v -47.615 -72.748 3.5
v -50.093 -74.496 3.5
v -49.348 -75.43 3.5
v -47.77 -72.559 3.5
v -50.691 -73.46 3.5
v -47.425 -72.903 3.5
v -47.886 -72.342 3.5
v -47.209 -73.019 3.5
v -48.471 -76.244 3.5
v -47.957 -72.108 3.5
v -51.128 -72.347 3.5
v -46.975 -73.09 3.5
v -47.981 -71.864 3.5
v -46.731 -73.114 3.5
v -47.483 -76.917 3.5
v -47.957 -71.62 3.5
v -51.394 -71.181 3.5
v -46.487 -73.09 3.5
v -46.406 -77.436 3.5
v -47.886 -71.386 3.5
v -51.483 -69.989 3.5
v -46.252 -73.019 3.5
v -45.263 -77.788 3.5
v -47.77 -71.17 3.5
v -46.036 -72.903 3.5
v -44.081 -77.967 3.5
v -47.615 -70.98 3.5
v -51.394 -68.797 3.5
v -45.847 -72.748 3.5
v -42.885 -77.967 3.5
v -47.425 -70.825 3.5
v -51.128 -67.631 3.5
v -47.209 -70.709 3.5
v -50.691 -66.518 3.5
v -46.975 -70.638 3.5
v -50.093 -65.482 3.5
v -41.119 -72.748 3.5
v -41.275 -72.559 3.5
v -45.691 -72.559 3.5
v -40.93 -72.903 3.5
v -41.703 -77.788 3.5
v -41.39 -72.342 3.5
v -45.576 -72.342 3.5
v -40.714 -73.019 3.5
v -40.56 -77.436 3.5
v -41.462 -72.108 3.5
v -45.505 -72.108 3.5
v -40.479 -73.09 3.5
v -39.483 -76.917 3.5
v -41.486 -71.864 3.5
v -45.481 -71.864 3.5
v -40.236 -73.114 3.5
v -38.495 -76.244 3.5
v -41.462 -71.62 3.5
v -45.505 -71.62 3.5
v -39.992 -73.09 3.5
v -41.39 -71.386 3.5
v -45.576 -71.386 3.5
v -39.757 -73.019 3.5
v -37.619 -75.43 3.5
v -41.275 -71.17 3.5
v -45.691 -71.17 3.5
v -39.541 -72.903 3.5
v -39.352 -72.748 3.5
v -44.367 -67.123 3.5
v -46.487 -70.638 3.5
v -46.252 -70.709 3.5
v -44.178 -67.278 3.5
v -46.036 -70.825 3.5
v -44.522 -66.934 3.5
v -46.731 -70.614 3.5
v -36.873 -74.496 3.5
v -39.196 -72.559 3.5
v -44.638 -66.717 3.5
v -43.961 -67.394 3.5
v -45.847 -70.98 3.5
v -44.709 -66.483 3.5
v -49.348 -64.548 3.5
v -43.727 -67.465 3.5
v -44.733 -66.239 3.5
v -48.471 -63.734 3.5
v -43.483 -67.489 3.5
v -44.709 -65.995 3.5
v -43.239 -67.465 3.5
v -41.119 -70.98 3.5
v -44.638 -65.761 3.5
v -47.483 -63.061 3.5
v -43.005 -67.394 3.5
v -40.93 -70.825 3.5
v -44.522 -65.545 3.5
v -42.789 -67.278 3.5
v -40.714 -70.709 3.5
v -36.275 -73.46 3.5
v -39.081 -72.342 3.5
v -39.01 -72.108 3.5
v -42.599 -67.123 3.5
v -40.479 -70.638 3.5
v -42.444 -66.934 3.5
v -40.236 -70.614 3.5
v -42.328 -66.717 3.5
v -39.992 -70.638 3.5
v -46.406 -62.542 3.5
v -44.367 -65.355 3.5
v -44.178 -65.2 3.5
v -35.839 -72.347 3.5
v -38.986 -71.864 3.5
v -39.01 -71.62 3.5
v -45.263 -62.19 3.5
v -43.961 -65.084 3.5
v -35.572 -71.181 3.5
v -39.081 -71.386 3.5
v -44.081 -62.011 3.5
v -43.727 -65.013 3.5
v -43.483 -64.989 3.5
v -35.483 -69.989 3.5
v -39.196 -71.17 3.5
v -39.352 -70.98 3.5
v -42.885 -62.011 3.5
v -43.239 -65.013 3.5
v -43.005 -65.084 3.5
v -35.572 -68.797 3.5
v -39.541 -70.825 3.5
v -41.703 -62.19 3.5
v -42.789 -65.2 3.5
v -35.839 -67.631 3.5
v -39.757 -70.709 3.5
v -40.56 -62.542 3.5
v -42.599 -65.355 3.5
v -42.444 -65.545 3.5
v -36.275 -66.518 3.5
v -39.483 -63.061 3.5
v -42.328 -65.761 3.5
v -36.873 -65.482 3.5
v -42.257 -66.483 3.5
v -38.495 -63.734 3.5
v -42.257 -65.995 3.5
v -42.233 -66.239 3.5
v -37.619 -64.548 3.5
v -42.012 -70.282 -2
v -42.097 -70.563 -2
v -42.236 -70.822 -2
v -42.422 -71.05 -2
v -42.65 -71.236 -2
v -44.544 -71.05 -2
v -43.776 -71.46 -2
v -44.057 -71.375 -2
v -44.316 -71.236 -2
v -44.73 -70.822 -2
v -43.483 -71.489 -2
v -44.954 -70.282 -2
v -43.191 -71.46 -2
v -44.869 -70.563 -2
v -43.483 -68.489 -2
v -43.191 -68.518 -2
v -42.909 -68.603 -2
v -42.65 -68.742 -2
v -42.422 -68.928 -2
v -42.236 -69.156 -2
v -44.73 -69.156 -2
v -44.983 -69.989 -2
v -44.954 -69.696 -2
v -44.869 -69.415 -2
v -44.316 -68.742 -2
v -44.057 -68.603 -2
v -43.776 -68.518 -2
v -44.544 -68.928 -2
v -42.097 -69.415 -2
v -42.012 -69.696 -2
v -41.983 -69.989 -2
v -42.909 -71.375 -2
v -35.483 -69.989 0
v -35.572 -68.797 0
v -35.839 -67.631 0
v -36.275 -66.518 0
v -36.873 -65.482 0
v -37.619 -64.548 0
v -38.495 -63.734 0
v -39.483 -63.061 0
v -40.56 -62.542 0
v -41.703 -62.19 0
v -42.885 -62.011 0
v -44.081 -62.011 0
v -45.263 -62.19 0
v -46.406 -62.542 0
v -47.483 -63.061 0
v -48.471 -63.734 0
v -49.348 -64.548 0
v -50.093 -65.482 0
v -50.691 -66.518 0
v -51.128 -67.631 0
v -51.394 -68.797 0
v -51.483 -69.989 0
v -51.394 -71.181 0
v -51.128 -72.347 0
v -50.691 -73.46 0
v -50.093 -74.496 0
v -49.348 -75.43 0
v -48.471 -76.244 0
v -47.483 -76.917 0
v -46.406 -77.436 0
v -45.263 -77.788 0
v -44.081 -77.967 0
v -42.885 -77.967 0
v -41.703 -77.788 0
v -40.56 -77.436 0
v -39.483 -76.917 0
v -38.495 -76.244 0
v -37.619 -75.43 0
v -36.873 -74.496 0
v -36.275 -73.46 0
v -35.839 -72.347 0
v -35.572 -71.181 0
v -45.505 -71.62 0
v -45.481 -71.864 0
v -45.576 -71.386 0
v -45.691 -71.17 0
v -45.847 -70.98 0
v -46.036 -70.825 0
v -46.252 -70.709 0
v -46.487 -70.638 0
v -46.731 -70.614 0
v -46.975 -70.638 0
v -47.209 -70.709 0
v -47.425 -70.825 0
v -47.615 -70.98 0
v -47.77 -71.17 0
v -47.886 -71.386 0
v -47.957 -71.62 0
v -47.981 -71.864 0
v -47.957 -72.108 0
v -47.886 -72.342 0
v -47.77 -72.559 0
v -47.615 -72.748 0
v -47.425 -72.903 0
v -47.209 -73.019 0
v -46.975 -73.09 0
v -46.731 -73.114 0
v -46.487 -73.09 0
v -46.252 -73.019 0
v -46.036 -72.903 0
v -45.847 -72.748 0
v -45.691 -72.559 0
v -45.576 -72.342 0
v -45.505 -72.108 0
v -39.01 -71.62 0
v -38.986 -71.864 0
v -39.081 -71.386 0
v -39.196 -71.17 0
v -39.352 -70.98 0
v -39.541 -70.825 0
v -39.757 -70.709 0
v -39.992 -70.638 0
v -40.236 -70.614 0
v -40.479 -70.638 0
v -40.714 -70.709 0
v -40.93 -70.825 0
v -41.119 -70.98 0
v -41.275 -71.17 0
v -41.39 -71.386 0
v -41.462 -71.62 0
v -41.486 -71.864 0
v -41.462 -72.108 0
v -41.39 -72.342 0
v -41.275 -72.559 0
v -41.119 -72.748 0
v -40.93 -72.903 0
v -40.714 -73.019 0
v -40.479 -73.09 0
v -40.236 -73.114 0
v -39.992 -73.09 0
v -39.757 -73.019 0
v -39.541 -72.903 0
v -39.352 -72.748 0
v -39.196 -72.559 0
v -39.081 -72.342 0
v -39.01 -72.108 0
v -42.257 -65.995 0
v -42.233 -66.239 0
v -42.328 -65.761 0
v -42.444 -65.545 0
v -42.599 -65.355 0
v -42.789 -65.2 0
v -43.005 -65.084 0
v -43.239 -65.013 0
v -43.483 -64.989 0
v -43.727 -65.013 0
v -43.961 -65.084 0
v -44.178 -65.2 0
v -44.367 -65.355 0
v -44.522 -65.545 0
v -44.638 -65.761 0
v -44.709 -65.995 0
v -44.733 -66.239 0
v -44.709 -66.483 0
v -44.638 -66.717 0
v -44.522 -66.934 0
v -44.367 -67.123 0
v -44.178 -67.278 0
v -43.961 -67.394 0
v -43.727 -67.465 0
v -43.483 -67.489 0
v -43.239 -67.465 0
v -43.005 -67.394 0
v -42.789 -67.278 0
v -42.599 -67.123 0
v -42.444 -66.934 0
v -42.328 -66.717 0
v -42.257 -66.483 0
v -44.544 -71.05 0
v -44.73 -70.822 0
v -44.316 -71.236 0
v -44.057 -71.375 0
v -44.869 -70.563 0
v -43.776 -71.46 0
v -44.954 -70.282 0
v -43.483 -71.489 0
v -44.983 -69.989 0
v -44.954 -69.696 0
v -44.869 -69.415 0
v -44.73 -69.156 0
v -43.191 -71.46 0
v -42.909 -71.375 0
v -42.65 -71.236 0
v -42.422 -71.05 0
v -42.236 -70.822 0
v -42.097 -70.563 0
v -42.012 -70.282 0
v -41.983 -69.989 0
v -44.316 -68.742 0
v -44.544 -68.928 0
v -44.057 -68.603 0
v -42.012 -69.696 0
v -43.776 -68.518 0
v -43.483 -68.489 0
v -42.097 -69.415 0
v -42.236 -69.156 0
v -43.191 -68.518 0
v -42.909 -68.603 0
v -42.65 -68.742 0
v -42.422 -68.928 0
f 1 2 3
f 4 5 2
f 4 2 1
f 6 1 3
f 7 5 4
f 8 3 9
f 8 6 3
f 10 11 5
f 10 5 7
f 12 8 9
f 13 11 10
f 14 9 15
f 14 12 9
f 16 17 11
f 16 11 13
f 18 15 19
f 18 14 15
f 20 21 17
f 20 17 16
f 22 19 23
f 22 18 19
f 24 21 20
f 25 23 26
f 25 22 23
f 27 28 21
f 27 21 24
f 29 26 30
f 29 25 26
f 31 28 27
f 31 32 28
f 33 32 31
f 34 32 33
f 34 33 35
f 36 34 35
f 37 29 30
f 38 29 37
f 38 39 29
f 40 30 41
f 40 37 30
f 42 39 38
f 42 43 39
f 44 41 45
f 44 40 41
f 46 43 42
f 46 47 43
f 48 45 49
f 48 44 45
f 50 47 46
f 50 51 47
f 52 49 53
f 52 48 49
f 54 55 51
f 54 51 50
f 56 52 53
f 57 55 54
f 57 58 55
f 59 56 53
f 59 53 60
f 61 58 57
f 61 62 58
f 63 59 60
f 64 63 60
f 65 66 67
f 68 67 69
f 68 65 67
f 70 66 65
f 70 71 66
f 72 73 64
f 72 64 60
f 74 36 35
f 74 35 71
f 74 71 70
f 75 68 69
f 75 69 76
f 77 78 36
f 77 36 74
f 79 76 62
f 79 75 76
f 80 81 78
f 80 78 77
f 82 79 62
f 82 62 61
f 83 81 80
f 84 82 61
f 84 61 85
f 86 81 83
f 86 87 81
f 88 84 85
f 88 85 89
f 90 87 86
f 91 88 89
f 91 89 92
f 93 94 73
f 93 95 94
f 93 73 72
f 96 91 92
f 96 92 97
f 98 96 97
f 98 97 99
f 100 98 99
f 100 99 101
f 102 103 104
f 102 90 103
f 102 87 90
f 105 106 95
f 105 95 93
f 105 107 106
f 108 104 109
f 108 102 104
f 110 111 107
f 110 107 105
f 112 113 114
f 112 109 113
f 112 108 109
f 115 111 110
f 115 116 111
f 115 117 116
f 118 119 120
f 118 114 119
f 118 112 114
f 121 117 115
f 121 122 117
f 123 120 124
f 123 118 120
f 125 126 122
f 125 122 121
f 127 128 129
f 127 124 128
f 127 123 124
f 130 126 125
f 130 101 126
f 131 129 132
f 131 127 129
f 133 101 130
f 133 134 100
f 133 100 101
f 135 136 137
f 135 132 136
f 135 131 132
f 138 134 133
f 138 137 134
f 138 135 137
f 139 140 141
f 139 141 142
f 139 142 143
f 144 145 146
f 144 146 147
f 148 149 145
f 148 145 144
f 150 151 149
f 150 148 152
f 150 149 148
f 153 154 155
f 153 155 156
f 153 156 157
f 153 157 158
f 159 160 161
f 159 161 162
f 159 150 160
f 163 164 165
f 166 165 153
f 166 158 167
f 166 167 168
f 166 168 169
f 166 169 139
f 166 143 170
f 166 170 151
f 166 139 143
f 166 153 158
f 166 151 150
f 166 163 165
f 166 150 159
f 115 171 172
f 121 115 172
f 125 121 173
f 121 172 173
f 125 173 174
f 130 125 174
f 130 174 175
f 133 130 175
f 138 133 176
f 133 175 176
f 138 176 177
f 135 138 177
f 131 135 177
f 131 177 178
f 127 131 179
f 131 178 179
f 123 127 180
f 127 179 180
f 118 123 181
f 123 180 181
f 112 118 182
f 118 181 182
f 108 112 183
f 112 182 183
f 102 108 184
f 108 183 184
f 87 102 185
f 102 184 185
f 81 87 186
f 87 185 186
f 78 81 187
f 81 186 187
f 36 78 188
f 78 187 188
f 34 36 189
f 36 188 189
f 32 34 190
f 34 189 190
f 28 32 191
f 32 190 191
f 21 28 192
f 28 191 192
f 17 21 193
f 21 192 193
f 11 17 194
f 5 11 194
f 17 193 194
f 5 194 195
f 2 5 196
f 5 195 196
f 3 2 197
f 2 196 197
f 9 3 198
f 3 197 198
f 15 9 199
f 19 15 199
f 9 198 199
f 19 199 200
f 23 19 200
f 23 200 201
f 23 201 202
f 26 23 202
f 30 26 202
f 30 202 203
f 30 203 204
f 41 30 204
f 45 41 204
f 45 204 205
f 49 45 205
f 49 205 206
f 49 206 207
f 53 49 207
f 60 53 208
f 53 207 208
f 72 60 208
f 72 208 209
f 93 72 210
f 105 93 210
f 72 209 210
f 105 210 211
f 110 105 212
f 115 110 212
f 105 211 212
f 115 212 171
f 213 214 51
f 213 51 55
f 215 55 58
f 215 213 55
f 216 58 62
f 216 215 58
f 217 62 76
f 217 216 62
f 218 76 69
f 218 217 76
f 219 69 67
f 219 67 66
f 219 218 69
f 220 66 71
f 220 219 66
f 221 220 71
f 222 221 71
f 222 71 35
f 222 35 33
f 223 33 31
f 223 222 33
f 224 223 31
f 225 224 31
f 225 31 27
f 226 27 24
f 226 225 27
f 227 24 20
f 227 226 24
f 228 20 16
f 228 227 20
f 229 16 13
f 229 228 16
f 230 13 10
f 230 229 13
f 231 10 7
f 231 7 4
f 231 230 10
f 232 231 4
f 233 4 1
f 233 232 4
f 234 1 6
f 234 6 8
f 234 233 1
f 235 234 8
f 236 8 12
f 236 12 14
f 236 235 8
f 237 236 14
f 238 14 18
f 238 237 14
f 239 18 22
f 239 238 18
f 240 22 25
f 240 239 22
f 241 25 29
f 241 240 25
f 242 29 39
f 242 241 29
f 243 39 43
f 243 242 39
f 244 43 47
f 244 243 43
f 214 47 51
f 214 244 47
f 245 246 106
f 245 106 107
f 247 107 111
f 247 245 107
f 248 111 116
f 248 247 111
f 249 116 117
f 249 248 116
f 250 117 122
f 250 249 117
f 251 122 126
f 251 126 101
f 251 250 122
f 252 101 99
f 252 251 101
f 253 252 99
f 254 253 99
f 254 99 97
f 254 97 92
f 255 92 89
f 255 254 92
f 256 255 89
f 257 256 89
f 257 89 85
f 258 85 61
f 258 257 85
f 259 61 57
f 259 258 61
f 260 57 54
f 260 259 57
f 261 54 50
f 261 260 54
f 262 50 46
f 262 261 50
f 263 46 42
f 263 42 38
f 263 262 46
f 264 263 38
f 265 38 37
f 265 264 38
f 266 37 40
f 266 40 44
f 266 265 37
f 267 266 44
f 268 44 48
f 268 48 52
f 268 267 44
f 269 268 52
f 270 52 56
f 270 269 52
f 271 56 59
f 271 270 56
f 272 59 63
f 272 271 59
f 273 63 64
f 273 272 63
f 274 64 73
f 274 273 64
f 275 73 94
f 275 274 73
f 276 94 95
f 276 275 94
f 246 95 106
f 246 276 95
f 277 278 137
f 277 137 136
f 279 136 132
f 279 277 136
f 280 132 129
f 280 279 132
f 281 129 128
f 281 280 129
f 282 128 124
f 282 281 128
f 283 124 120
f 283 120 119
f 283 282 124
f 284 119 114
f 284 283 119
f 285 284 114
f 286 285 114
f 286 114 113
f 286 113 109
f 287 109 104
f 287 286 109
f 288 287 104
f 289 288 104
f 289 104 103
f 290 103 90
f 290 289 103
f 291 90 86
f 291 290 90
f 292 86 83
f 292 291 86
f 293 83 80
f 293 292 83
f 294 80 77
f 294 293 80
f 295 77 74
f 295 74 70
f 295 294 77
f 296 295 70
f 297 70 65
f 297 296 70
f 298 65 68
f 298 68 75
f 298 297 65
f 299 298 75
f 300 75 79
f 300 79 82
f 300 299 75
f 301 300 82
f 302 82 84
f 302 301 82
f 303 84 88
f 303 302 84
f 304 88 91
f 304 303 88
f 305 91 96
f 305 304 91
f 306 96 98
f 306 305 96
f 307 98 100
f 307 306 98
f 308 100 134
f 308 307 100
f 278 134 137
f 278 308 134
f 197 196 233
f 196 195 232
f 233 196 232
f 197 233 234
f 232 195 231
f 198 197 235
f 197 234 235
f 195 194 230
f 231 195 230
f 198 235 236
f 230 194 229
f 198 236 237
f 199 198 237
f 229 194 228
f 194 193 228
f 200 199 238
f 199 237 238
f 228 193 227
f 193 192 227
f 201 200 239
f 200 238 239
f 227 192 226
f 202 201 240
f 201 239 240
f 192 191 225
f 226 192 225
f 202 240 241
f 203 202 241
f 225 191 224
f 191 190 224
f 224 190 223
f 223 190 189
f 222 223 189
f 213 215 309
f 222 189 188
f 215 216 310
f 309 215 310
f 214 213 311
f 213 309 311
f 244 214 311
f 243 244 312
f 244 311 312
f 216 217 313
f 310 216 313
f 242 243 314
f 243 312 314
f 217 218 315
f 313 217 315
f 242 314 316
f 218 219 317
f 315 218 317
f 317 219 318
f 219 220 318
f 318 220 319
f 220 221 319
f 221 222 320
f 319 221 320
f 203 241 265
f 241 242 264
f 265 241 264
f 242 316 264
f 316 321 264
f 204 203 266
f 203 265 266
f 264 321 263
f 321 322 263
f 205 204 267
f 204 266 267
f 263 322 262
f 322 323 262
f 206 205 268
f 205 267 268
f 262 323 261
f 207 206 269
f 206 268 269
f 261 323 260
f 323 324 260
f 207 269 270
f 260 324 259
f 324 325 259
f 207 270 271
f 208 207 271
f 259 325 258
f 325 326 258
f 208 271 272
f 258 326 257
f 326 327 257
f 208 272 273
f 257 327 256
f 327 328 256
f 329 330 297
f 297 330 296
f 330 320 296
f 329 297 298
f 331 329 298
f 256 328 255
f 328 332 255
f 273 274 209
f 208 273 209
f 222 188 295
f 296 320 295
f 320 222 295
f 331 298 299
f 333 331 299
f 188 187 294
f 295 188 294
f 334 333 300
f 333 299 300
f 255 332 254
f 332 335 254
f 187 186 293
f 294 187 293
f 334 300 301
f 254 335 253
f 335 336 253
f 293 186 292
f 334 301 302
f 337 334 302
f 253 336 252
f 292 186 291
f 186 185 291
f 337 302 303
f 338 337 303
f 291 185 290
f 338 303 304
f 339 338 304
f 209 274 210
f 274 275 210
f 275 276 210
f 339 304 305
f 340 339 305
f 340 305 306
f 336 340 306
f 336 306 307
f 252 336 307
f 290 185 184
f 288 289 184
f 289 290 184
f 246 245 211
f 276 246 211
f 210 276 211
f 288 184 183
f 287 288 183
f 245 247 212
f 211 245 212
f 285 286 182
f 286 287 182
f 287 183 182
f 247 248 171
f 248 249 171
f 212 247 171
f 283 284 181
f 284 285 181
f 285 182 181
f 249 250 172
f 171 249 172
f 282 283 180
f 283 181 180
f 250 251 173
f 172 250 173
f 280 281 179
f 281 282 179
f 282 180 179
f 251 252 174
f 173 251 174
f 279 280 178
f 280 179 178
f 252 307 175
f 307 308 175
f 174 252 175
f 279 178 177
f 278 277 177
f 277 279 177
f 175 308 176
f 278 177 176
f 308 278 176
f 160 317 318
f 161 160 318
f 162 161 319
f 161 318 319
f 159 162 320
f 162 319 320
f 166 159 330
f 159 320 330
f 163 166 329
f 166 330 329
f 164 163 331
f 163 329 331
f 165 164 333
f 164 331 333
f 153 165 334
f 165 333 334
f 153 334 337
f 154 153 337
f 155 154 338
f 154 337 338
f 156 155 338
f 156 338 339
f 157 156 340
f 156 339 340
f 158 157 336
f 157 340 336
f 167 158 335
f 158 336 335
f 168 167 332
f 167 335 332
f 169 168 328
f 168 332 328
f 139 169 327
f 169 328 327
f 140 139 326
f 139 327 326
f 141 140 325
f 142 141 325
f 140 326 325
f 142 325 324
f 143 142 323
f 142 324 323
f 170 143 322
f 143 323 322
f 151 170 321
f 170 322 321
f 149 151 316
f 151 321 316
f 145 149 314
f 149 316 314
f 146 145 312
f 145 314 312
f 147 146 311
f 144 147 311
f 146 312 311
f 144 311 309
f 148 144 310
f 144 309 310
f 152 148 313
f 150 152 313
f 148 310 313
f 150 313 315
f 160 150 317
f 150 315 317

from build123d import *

# Parameters (mm, degrees)
SKETCH1_R           = 8
SKETCH1_R_2         = 6
SKETCH1_R_3         = 1.25
SKETCH1_R_4         = 1.5
BOSS_EXTRUDE1_DEPTH = 3.5
SKETCH2_R           = 1.5
BOSS_EXTRUDE2_DEPTH = 2


with BuildPart() as part:
    # Sketch1 → Boss-Extrude1 (new body)
    with BuildSketch(Plane.XY):
        with Locations((-43.483141232, -69.989052064)):
            Circle(SKETCH1_R)
        with Locations((-43.483141232, -69.989052064)):
            Circle(SKETCH1_R_2, mode=Mode.SUBTRACT)
        with Locations((-43.483141232, -69.989052064)):
            Circle(SKETCH1_R)
        with Locations((-40.235545968, -71.864052064)):
            Circle(SKETCH1_R_3, mode=Mode.SUBTRACT)
        with Locations((-46.730736496, -71.864052064)):
            Circle(SKETCH1_R_3, mode=Mode.SUBTRACT)
        with Locations((-43.483141232, -66.239052064)):
            Circle(SKETCH1_R_3, mode=Mode.SUBTRACT)
        with Locations((-43.483141232, -69.989052064)):
            Circle(SKETCH1_R_4, mode=Mode.SUBTRACT)
        with Locations((-43.483141232, -69.989052064)):
            Circle(SKETCH1_R_4)
    extrude(amount=BOSS_EXTRUDE1_DEPTH)

    # Sketch2 → Boss-Extrude2 (add)
    with BuildSketch(Plane(origin=(0, 0, 0), x_dir=(-1, 0, 0), z_dir=(0, 0, -1))):
        with Locations((43.483141232, -69.989052064)):
            Circle(SKETCH2_R)
    extrude(amount=BOSS_EXTRUDE2_DEPTH)


solid = part.part
